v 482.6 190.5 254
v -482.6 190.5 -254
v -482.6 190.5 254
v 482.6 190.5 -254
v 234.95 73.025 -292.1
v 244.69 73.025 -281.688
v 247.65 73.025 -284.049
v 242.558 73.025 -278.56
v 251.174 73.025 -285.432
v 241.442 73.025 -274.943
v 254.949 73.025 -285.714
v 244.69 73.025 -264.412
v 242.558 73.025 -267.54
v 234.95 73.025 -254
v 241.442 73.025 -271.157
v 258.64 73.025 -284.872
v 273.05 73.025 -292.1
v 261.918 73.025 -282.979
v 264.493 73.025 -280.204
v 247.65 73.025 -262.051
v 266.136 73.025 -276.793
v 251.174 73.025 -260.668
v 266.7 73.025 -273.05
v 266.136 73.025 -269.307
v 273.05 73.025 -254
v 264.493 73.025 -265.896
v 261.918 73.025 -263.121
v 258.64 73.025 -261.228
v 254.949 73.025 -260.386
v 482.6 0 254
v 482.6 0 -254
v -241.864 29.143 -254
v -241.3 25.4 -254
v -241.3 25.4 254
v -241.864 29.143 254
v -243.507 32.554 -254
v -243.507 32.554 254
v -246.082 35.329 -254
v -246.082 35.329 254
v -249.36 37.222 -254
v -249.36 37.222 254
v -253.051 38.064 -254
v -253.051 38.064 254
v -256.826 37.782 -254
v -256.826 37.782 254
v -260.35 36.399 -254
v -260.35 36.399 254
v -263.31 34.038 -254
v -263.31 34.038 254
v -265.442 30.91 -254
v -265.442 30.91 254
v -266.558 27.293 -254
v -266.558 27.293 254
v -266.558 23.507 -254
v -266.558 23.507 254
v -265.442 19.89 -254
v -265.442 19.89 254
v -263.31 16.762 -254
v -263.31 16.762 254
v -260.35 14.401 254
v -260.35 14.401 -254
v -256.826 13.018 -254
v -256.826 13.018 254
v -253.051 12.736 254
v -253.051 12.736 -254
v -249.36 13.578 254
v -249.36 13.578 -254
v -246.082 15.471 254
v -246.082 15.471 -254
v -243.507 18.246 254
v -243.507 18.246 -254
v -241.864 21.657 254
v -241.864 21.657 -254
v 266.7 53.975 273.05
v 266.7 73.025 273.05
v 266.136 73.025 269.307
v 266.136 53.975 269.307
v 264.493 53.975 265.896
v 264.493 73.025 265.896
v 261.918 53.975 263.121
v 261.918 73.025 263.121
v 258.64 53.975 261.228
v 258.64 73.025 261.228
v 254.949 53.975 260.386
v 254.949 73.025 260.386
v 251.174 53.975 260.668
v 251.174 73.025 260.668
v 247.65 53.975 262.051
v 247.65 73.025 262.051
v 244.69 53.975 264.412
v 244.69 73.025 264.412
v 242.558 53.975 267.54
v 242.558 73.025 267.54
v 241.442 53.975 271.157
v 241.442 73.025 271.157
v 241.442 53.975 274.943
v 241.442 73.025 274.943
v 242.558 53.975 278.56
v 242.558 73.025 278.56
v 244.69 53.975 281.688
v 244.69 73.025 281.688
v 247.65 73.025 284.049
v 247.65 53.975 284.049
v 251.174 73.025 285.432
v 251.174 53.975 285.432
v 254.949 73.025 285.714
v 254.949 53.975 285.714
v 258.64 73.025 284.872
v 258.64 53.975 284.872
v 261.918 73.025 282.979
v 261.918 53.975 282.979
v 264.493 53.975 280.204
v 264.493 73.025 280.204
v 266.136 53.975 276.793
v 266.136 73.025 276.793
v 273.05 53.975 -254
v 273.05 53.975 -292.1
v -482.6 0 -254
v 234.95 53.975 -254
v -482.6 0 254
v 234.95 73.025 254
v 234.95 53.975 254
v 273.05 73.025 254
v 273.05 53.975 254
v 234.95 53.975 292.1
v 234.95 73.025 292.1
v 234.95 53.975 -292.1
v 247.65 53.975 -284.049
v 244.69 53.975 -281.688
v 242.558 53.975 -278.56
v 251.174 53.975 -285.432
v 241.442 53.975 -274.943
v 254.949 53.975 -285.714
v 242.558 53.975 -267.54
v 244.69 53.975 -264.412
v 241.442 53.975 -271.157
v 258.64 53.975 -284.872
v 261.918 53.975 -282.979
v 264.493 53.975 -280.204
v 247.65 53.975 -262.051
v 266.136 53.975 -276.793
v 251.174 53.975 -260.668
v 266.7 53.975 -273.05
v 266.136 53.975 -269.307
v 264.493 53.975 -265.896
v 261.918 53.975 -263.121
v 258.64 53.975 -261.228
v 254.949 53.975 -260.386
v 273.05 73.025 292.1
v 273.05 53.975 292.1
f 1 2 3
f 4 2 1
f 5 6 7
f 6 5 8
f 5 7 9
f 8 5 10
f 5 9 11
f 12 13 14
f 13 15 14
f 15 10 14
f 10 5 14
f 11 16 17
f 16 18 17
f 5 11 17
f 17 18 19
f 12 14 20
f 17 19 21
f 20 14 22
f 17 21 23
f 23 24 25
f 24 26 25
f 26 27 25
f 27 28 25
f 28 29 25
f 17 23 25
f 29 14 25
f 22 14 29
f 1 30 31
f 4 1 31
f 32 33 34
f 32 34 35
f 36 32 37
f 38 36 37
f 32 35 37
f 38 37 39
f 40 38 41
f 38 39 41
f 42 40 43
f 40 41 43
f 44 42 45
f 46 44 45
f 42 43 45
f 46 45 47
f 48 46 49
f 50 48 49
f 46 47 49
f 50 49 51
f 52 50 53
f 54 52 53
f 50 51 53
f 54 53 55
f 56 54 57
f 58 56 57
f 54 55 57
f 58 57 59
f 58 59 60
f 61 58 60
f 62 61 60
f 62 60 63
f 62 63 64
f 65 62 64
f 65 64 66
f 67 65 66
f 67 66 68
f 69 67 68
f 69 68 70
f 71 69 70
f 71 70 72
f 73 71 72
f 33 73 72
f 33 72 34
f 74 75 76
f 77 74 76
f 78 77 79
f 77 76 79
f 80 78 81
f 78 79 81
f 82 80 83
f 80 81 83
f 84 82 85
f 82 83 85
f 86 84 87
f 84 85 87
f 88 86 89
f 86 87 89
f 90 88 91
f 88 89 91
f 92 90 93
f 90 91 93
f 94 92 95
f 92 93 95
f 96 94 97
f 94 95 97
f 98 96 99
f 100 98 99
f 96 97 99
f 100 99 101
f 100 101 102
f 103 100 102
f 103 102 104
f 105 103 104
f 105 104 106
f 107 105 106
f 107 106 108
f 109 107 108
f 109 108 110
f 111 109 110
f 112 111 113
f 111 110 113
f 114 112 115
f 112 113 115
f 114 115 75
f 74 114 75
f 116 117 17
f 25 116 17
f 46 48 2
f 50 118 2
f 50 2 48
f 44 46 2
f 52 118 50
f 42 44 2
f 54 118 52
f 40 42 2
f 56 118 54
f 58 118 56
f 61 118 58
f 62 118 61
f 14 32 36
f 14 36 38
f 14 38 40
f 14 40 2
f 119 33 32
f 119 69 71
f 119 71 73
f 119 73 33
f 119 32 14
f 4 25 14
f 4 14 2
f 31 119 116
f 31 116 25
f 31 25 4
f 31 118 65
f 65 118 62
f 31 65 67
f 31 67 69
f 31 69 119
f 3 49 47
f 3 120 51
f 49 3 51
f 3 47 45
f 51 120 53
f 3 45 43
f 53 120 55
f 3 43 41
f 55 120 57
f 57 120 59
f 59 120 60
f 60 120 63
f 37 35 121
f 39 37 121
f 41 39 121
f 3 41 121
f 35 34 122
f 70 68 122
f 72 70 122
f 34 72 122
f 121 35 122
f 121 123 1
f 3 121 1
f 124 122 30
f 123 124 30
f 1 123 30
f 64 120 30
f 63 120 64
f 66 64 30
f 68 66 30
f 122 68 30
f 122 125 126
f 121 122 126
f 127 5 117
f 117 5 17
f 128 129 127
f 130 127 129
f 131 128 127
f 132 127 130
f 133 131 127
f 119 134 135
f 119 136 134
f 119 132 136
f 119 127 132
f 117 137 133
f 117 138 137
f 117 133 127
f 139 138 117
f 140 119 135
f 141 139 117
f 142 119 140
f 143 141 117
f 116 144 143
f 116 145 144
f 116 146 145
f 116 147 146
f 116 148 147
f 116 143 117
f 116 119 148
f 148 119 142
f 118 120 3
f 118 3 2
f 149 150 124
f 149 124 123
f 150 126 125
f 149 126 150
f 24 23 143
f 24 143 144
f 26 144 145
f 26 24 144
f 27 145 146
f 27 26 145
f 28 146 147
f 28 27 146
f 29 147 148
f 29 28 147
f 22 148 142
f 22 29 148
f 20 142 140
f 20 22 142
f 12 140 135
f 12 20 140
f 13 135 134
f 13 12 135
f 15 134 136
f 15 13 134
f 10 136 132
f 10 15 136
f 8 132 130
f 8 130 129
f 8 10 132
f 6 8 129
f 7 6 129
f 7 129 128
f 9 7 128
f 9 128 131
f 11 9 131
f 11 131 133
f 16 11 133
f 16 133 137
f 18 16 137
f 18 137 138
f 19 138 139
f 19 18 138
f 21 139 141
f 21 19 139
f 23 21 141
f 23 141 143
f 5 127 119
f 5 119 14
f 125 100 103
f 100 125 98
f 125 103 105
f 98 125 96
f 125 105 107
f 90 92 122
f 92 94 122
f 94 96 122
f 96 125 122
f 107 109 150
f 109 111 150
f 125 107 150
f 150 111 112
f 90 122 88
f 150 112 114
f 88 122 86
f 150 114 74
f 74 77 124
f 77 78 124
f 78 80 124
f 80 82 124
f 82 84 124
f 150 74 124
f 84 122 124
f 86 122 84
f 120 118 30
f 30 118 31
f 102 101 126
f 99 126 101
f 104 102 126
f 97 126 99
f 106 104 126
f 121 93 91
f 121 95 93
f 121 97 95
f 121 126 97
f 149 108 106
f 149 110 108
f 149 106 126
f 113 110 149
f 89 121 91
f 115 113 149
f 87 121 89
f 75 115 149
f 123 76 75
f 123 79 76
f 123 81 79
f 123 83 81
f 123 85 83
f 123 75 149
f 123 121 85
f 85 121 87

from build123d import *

# Parameters (mm, degrees)
SKETCH1_W           = 965.2
SKETCH1_H           = 508
BOSS_EXTRUDE1_DEPTH = 190.5
SKETCH2_W           = 38.1
SKETCH2_H           = 19.05
BOSS_EXTRUDE3_DEPTH = 38.1
CUT_EXTRUDE1_REACH  = 578.217
SKETCH3_R           = 12.7
CUT_EXTRUDE2_REACH  = 728.125
SKETCH2_4_R         = 12.7


with BuildPart() as part:
    # Sketch1 → Boss-Extrude1 (new body)
    with BuildSketch(Plane(origin=(0, 0, 0), x_dir=(1, 0, 0), z_dir=(0, 1, 0))):
        Rectangle(SKETCH1_W, SKETCH1_H)
    extrude(amount=BOSS_EXTRUDE1_DEPTH)

    # Sketch2 → Boss-Extrude3 (add)
    with BuildSketch(Plane.XY.offset(254)):
        with Locations((254, 63.5)):
            Rectangle(SKETCH2_W, SKETCH2_H)
    boss_extrude3 = extrude(amount=BOSS_EXTRUDE3_DEPTH)

    # Sketch3 → Cut-Extrude1 (cut, up to next)
    with BuildSketch(Plane(origin=(0, 73.025, 0), x_dir=(1, 0, 0), z_dir=(0, 1, 0)), mode=Mode.PRIVATE) as cut_extrude1_sk1:
        with Locations((254, -273.05)):
            Circle(SKETCH3_R)
    cut_extrude1_tool1 = extrude(cut_extrude1_sk1.sketch, amount=-CUT_EXTRUDE1_REACH, mode=Mode.PRIVATE) & part.part
    cut_extrude1 = cut_extrude1_tool1.solids().sort_by_distance((254, 73.025, 273.05))[0]
    add(cut_extrude1, mode=Mode.SUBTRACT)

    # Sketch2<4> → Cut-Extrude2 (cut, up to next)
    with BuildSketch(Plane.XY.offset(254), mode=Mode.PRIVATE) as cut_extrude2_sk1:
        with Locations((-254, 25.4)):
            Circle(SKETCH2_4_R)
    cut_extrude2_tool1 = extrude(cut_extrude2_sk1.sketch, amount=-CUT_EXTRUDE2_REACH, mode=Mode.PRIVATE) & part.part
    add(cut_extrude2_tool1.solids().sort_by_distance((-254, 25.4, 254))[0], mode=Mode.SUBTRACT)

    # Mirror2: Boss-Extrude3, Cut-Extrude1 across plane
    add(boss_extrude3.mirror(Plane.XY))
    add(cut_extrude1.mirror(Plane.XY), mode=Mode.SUBTRACT)


solid = part.part
